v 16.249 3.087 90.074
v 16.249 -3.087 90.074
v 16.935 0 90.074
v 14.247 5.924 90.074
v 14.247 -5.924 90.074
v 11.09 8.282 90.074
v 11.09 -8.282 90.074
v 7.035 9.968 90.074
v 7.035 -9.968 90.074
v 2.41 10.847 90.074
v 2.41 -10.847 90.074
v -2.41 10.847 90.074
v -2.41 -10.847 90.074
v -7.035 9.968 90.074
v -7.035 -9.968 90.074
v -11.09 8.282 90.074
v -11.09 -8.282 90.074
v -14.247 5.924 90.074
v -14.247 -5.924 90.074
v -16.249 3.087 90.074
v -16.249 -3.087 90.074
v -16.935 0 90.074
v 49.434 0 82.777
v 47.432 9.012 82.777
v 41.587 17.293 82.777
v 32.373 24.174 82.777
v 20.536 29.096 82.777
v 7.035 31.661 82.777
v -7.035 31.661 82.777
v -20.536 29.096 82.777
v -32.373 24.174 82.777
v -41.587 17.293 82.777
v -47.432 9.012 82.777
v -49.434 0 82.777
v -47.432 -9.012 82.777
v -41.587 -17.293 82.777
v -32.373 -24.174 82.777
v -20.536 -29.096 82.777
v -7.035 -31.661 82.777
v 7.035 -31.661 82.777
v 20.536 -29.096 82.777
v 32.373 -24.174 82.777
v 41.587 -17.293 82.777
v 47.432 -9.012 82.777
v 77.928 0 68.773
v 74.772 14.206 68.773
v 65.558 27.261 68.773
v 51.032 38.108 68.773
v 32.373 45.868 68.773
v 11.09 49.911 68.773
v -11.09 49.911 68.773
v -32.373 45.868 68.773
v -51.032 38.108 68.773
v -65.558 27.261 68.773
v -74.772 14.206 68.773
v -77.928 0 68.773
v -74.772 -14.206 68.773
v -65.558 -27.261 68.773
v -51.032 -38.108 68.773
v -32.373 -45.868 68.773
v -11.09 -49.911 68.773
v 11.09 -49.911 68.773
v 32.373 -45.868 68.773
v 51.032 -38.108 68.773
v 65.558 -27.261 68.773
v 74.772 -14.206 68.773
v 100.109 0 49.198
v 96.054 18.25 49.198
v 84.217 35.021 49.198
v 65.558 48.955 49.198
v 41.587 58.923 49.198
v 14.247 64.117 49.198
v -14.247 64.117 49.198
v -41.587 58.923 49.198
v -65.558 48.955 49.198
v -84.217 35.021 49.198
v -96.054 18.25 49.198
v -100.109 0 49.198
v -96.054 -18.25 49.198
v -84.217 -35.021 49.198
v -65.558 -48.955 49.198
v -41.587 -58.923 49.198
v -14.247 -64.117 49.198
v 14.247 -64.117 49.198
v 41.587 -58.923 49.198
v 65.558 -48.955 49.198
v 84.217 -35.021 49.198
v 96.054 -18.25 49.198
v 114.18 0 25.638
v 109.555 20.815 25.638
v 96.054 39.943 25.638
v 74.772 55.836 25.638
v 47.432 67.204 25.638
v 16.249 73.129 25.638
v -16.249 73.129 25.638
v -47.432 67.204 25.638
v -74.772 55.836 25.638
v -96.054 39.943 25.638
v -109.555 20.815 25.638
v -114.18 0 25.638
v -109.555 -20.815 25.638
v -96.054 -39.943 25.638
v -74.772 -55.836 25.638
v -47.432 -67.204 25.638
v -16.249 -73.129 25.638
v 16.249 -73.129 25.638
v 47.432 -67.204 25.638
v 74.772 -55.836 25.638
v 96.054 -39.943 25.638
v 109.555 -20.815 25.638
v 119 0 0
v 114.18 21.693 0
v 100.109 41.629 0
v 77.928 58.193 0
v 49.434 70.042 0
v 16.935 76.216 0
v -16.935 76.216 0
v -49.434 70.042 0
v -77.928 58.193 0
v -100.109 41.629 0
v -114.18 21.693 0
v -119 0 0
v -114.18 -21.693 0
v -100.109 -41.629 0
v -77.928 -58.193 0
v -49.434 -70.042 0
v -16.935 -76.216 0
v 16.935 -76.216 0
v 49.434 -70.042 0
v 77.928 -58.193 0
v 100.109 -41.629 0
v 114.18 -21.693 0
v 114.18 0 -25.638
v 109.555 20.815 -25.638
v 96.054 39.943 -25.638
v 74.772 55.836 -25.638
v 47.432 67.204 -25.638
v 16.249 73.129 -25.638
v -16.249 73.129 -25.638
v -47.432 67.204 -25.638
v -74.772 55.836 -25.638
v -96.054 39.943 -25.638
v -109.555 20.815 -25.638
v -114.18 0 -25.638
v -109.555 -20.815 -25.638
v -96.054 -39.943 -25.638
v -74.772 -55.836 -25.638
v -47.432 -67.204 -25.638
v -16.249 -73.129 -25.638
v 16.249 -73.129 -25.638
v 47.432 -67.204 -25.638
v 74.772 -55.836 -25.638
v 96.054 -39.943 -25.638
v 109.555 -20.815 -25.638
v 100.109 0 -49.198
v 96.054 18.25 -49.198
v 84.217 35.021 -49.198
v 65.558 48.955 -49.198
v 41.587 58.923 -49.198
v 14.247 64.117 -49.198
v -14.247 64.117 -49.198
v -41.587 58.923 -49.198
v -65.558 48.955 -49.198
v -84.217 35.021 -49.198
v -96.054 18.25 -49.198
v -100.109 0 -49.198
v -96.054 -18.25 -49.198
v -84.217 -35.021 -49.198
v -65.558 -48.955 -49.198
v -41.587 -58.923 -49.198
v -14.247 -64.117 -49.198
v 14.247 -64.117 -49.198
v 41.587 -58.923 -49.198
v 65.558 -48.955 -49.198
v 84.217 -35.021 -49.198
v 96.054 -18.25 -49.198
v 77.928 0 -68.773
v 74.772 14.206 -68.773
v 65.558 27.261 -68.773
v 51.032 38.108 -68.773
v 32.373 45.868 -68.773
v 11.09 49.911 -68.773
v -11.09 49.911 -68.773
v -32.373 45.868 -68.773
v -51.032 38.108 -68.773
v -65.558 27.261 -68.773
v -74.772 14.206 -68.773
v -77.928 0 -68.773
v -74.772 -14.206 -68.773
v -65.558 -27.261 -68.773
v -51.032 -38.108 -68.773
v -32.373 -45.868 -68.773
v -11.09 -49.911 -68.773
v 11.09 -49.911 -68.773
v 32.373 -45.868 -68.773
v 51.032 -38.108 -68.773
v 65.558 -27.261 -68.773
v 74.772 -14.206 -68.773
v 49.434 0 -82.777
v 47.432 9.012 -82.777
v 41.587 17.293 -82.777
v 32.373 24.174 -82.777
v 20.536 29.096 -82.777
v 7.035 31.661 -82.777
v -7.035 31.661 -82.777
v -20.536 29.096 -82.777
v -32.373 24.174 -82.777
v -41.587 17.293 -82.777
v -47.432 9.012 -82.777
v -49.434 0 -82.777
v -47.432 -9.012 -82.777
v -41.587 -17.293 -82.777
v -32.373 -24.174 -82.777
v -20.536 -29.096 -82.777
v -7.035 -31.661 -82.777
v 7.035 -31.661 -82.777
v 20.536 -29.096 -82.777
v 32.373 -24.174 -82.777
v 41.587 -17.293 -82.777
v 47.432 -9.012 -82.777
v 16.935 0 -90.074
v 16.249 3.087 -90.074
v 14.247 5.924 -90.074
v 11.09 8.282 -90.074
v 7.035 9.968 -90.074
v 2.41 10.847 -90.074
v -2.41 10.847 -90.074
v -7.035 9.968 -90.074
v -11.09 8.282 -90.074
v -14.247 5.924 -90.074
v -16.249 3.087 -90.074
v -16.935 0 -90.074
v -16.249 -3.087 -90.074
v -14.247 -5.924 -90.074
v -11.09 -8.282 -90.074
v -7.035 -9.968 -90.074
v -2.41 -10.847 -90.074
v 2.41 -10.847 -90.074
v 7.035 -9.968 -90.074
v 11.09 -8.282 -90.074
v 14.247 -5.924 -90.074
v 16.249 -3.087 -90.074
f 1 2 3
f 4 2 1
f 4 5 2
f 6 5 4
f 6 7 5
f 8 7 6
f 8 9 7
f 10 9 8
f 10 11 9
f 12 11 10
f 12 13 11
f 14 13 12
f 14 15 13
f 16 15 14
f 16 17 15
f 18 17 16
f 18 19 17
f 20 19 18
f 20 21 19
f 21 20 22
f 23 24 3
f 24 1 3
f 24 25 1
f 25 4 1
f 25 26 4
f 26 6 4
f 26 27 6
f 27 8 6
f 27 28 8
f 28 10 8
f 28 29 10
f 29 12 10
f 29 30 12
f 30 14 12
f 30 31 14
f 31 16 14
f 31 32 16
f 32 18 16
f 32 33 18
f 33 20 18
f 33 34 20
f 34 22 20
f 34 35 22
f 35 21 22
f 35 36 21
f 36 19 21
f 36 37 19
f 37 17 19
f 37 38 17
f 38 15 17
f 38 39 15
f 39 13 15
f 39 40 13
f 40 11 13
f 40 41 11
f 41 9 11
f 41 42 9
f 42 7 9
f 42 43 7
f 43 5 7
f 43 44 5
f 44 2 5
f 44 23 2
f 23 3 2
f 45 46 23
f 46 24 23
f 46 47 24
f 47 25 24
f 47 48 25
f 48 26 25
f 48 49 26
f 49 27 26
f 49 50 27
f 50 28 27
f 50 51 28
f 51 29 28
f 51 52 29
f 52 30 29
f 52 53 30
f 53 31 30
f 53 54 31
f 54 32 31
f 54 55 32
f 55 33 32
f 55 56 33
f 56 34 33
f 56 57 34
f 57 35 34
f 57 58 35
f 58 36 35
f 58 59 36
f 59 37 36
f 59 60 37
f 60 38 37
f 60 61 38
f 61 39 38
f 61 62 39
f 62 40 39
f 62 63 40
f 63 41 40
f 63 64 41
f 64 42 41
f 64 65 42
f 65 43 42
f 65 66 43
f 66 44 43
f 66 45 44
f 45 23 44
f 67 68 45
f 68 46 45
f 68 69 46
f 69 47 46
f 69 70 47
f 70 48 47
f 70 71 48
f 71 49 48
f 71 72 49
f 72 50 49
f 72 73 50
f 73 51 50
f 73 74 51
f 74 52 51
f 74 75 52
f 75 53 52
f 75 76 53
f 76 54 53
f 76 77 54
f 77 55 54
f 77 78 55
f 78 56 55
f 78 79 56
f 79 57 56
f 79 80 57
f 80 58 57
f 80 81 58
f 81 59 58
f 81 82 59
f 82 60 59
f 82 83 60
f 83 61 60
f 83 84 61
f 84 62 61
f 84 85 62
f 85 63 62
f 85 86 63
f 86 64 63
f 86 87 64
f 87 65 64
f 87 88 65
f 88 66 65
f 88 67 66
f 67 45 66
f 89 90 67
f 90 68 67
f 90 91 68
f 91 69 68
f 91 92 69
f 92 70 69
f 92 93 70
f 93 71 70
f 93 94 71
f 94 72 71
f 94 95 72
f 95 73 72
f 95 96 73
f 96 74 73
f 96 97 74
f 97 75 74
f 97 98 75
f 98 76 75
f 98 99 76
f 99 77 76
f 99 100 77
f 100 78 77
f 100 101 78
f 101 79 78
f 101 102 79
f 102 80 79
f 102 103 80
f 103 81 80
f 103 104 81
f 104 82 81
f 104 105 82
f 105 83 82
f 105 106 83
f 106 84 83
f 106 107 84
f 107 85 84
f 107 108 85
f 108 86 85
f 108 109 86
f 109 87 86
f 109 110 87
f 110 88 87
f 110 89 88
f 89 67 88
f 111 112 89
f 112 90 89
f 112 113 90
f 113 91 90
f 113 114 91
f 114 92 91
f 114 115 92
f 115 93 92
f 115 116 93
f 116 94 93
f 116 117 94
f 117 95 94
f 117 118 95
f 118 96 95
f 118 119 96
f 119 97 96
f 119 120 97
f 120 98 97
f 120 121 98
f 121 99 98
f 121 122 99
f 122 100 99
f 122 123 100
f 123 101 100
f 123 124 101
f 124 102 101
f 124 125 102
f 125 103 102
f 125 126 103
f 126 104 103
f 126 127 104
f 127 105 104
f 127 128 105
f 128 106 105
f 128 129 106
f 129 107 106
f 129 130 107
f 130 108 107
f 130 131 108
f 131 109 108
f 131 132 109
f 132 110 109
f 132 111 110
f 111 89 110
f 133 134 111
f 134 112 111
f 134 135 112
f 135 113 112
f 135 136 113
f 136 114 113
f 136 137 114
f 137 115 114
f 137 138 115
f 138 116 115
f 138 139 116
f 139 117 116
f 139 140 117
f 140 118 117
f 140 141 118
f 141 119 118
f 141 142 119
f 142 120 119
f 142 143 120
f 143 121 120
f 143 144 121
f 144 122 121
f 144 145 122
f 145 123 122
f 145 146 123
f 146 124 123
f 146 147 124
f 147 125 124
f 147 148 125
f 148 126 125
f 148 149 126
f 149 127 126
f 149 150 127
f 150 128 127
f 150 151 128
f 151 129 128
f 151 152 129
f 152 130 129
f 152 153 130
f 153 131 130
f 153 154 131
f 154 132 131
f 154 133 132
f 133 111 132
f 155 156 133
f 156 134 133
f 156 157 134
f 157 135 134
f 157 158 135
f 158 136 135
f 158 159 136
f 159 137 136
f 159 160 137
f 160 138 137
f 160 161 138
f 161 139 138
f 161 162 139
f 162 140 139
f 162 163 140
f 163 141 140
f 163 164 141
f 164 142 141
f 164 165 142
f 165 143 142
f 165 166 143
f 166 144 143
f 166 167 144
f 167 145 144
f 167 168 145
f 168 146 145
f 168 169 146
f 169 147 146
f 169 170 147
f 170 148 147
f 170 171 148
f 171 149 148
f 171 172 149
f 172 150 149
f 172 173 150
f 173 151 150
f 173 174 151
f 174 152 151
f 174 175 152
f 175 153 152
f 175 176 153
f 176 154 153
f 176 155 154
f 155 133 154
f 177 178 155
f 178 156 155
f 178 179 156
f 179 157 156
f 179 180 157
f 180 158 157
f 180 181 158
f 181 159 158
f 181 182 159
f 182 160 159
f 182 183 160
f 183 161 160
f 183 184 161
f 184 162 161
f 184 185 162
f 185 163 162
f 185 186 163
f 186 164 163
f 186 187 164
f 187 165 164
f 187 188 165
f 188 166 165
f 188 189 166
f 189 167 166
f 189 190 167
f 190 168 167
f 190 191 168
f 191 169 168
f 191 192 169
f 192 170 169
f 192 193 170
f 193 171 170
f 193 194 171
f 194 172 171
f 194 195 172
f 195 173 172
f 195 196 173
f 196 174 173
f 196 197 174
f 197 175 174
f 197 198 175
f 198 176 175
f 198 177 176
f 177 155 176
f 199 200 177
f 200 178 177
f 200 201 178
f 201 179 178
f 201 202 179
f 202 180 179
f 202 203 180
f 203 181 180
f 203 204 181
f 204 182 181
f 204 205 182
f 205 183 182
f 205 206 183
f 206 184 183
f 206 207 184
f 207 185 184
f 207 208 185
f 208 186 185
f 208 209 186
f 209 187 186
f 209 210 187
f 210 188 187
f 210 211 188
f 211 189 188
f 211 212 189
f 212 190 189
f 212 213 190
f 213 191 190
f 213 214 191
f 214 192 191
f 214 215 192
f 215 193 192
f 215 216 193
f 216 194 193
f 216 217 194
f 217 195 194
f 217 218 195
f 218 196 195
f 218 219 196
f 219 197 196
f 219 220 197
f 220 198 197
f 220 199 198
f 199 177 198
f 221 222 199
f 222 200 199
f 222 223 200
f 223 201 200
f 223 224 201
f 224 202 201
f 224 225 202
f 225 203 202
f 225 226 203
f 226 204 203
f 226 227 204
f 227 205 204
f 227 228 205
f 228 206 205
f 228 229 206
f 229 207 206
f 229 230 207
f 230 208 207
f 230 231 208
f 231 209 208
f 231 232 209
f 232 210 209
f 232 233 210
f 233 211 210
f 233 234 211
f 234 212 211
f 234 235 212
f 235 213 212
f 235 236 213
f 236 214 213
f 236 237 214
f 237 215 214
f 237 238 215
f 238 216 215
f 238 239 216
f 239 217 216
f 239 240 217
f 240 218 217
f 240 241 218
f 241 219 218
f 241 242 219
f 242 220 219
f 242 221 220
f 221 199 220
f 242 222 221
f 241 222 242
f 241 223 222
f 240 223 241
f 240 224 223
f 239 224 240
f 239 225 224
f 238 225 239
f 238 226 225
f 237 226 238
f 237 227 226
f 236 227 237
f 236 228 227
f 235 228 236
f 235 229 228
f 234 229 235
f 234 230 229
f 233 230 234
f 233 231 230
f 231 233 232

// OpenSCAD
// Generated by SolidPython 1.0.1 on 2020-07-29 00:46:53


scale(v = [17, 11, 13]) {
	sphere(r = 7);
}
/***********************************************
*********      SolidPython code:      **********
************************************************
 
# import packages: SolidPython
from solid import *
from solid.utils import *
from itertools import chain, combinations, permutations


class Resize:

    def __init__(self, scad_file):
        self.scad_file = scad_file
        #self.scad_file = import_scad(scad_file)
        # cone/cylinder param:
        self.r1 = 0
        self.r2 = 0
        self.h = 0
        # rectangular prism param:
        self.w = 0
        self.l = 0
        # ellipse param:
        self.r = 0

    # import OpenScad code (file name corresponds to shape)


    # classify shape + parameters
    def assign(self, param1, param2, param3):
        if self.scad_file == 'cone.scad':
            self.r1 = param1
            self.r2 = param2
            self.h = param3
        elif self.scad_file == 'cylinder.scad':
            self.r1 = param1
            self.r2 = param2
            self.h = param3
        elif self.scad_file == 'rectangularPrism.scad':
            self.h = param1
            self.l = param2
            self.w = param3
        else:
            self.r = param1
            self.h = param2

    # resize parameters
    def iterate(self):
        x = range(3, 20, 2)
        i = 1
        if self.scad_file == 'cone.scad':
            tempList = list(permutations(x, 2))
            for temp in tempList:
                param1 = temp[0]
                param2 = temp[1]
                filepath = 'produced_scad_files/' + 'cone' + str(param1) + '_' + str(param2) + '_' + '.scad'
                scad_render_to_file(cylinder(h=param1, r1=param2, r2=0), filepath)

        elif self.scad_file == 'cylinder.scad':
            tempList = list(permutations(x, 3))
            for temp in tempList:
                param1 = temp[0]
                param2 = temp[1]
                filepath = 'produced_scad_files/' + 'cylinder' + str(param1) + '_' + str(param2) + '_' + '.scad'
                scad_render_to_file(cylinder(h=param1, r1=param2, r2=param2), filepath)

        elif self.scad_file == 'rectangularPrism.scad':
            tempList = list(permutations(x, 3))
            for temp in tempList:
                param1 = temp[0]
                param2 = temp[1]
                param3 = temp[2]
                filepath = 'produced_scad_files/' + 'rectangularPrism' + str(param1) + '_' + str(param2) + '_' + str(
                    param3) + '.scad'
                scad_render_to_file(cube(size=(param1, param2, param3)), filepath)

        elif self.scad_file == 'ellipse.scad':
            tempList = list(permutations(x, 4))
            for temp in tempList:
                param1 = temp[0]
                param2 = temp[1]
                param3 = temp[2]
                param4 = temp[3]
                filepath = 'produced_scad_files/' + 'ellipse' + str(param1) + '_' + str(param2) + '_' + str(param3) + '_' + str(param4) + '.scad'
                scad_render_to_file(scale([param1, param2, param3])(sphere(r=param4)), filepath)

    def render_to_scadfile(self):
        scad_render_to_file(scad, 'example.scad') 
 
************************************************/
